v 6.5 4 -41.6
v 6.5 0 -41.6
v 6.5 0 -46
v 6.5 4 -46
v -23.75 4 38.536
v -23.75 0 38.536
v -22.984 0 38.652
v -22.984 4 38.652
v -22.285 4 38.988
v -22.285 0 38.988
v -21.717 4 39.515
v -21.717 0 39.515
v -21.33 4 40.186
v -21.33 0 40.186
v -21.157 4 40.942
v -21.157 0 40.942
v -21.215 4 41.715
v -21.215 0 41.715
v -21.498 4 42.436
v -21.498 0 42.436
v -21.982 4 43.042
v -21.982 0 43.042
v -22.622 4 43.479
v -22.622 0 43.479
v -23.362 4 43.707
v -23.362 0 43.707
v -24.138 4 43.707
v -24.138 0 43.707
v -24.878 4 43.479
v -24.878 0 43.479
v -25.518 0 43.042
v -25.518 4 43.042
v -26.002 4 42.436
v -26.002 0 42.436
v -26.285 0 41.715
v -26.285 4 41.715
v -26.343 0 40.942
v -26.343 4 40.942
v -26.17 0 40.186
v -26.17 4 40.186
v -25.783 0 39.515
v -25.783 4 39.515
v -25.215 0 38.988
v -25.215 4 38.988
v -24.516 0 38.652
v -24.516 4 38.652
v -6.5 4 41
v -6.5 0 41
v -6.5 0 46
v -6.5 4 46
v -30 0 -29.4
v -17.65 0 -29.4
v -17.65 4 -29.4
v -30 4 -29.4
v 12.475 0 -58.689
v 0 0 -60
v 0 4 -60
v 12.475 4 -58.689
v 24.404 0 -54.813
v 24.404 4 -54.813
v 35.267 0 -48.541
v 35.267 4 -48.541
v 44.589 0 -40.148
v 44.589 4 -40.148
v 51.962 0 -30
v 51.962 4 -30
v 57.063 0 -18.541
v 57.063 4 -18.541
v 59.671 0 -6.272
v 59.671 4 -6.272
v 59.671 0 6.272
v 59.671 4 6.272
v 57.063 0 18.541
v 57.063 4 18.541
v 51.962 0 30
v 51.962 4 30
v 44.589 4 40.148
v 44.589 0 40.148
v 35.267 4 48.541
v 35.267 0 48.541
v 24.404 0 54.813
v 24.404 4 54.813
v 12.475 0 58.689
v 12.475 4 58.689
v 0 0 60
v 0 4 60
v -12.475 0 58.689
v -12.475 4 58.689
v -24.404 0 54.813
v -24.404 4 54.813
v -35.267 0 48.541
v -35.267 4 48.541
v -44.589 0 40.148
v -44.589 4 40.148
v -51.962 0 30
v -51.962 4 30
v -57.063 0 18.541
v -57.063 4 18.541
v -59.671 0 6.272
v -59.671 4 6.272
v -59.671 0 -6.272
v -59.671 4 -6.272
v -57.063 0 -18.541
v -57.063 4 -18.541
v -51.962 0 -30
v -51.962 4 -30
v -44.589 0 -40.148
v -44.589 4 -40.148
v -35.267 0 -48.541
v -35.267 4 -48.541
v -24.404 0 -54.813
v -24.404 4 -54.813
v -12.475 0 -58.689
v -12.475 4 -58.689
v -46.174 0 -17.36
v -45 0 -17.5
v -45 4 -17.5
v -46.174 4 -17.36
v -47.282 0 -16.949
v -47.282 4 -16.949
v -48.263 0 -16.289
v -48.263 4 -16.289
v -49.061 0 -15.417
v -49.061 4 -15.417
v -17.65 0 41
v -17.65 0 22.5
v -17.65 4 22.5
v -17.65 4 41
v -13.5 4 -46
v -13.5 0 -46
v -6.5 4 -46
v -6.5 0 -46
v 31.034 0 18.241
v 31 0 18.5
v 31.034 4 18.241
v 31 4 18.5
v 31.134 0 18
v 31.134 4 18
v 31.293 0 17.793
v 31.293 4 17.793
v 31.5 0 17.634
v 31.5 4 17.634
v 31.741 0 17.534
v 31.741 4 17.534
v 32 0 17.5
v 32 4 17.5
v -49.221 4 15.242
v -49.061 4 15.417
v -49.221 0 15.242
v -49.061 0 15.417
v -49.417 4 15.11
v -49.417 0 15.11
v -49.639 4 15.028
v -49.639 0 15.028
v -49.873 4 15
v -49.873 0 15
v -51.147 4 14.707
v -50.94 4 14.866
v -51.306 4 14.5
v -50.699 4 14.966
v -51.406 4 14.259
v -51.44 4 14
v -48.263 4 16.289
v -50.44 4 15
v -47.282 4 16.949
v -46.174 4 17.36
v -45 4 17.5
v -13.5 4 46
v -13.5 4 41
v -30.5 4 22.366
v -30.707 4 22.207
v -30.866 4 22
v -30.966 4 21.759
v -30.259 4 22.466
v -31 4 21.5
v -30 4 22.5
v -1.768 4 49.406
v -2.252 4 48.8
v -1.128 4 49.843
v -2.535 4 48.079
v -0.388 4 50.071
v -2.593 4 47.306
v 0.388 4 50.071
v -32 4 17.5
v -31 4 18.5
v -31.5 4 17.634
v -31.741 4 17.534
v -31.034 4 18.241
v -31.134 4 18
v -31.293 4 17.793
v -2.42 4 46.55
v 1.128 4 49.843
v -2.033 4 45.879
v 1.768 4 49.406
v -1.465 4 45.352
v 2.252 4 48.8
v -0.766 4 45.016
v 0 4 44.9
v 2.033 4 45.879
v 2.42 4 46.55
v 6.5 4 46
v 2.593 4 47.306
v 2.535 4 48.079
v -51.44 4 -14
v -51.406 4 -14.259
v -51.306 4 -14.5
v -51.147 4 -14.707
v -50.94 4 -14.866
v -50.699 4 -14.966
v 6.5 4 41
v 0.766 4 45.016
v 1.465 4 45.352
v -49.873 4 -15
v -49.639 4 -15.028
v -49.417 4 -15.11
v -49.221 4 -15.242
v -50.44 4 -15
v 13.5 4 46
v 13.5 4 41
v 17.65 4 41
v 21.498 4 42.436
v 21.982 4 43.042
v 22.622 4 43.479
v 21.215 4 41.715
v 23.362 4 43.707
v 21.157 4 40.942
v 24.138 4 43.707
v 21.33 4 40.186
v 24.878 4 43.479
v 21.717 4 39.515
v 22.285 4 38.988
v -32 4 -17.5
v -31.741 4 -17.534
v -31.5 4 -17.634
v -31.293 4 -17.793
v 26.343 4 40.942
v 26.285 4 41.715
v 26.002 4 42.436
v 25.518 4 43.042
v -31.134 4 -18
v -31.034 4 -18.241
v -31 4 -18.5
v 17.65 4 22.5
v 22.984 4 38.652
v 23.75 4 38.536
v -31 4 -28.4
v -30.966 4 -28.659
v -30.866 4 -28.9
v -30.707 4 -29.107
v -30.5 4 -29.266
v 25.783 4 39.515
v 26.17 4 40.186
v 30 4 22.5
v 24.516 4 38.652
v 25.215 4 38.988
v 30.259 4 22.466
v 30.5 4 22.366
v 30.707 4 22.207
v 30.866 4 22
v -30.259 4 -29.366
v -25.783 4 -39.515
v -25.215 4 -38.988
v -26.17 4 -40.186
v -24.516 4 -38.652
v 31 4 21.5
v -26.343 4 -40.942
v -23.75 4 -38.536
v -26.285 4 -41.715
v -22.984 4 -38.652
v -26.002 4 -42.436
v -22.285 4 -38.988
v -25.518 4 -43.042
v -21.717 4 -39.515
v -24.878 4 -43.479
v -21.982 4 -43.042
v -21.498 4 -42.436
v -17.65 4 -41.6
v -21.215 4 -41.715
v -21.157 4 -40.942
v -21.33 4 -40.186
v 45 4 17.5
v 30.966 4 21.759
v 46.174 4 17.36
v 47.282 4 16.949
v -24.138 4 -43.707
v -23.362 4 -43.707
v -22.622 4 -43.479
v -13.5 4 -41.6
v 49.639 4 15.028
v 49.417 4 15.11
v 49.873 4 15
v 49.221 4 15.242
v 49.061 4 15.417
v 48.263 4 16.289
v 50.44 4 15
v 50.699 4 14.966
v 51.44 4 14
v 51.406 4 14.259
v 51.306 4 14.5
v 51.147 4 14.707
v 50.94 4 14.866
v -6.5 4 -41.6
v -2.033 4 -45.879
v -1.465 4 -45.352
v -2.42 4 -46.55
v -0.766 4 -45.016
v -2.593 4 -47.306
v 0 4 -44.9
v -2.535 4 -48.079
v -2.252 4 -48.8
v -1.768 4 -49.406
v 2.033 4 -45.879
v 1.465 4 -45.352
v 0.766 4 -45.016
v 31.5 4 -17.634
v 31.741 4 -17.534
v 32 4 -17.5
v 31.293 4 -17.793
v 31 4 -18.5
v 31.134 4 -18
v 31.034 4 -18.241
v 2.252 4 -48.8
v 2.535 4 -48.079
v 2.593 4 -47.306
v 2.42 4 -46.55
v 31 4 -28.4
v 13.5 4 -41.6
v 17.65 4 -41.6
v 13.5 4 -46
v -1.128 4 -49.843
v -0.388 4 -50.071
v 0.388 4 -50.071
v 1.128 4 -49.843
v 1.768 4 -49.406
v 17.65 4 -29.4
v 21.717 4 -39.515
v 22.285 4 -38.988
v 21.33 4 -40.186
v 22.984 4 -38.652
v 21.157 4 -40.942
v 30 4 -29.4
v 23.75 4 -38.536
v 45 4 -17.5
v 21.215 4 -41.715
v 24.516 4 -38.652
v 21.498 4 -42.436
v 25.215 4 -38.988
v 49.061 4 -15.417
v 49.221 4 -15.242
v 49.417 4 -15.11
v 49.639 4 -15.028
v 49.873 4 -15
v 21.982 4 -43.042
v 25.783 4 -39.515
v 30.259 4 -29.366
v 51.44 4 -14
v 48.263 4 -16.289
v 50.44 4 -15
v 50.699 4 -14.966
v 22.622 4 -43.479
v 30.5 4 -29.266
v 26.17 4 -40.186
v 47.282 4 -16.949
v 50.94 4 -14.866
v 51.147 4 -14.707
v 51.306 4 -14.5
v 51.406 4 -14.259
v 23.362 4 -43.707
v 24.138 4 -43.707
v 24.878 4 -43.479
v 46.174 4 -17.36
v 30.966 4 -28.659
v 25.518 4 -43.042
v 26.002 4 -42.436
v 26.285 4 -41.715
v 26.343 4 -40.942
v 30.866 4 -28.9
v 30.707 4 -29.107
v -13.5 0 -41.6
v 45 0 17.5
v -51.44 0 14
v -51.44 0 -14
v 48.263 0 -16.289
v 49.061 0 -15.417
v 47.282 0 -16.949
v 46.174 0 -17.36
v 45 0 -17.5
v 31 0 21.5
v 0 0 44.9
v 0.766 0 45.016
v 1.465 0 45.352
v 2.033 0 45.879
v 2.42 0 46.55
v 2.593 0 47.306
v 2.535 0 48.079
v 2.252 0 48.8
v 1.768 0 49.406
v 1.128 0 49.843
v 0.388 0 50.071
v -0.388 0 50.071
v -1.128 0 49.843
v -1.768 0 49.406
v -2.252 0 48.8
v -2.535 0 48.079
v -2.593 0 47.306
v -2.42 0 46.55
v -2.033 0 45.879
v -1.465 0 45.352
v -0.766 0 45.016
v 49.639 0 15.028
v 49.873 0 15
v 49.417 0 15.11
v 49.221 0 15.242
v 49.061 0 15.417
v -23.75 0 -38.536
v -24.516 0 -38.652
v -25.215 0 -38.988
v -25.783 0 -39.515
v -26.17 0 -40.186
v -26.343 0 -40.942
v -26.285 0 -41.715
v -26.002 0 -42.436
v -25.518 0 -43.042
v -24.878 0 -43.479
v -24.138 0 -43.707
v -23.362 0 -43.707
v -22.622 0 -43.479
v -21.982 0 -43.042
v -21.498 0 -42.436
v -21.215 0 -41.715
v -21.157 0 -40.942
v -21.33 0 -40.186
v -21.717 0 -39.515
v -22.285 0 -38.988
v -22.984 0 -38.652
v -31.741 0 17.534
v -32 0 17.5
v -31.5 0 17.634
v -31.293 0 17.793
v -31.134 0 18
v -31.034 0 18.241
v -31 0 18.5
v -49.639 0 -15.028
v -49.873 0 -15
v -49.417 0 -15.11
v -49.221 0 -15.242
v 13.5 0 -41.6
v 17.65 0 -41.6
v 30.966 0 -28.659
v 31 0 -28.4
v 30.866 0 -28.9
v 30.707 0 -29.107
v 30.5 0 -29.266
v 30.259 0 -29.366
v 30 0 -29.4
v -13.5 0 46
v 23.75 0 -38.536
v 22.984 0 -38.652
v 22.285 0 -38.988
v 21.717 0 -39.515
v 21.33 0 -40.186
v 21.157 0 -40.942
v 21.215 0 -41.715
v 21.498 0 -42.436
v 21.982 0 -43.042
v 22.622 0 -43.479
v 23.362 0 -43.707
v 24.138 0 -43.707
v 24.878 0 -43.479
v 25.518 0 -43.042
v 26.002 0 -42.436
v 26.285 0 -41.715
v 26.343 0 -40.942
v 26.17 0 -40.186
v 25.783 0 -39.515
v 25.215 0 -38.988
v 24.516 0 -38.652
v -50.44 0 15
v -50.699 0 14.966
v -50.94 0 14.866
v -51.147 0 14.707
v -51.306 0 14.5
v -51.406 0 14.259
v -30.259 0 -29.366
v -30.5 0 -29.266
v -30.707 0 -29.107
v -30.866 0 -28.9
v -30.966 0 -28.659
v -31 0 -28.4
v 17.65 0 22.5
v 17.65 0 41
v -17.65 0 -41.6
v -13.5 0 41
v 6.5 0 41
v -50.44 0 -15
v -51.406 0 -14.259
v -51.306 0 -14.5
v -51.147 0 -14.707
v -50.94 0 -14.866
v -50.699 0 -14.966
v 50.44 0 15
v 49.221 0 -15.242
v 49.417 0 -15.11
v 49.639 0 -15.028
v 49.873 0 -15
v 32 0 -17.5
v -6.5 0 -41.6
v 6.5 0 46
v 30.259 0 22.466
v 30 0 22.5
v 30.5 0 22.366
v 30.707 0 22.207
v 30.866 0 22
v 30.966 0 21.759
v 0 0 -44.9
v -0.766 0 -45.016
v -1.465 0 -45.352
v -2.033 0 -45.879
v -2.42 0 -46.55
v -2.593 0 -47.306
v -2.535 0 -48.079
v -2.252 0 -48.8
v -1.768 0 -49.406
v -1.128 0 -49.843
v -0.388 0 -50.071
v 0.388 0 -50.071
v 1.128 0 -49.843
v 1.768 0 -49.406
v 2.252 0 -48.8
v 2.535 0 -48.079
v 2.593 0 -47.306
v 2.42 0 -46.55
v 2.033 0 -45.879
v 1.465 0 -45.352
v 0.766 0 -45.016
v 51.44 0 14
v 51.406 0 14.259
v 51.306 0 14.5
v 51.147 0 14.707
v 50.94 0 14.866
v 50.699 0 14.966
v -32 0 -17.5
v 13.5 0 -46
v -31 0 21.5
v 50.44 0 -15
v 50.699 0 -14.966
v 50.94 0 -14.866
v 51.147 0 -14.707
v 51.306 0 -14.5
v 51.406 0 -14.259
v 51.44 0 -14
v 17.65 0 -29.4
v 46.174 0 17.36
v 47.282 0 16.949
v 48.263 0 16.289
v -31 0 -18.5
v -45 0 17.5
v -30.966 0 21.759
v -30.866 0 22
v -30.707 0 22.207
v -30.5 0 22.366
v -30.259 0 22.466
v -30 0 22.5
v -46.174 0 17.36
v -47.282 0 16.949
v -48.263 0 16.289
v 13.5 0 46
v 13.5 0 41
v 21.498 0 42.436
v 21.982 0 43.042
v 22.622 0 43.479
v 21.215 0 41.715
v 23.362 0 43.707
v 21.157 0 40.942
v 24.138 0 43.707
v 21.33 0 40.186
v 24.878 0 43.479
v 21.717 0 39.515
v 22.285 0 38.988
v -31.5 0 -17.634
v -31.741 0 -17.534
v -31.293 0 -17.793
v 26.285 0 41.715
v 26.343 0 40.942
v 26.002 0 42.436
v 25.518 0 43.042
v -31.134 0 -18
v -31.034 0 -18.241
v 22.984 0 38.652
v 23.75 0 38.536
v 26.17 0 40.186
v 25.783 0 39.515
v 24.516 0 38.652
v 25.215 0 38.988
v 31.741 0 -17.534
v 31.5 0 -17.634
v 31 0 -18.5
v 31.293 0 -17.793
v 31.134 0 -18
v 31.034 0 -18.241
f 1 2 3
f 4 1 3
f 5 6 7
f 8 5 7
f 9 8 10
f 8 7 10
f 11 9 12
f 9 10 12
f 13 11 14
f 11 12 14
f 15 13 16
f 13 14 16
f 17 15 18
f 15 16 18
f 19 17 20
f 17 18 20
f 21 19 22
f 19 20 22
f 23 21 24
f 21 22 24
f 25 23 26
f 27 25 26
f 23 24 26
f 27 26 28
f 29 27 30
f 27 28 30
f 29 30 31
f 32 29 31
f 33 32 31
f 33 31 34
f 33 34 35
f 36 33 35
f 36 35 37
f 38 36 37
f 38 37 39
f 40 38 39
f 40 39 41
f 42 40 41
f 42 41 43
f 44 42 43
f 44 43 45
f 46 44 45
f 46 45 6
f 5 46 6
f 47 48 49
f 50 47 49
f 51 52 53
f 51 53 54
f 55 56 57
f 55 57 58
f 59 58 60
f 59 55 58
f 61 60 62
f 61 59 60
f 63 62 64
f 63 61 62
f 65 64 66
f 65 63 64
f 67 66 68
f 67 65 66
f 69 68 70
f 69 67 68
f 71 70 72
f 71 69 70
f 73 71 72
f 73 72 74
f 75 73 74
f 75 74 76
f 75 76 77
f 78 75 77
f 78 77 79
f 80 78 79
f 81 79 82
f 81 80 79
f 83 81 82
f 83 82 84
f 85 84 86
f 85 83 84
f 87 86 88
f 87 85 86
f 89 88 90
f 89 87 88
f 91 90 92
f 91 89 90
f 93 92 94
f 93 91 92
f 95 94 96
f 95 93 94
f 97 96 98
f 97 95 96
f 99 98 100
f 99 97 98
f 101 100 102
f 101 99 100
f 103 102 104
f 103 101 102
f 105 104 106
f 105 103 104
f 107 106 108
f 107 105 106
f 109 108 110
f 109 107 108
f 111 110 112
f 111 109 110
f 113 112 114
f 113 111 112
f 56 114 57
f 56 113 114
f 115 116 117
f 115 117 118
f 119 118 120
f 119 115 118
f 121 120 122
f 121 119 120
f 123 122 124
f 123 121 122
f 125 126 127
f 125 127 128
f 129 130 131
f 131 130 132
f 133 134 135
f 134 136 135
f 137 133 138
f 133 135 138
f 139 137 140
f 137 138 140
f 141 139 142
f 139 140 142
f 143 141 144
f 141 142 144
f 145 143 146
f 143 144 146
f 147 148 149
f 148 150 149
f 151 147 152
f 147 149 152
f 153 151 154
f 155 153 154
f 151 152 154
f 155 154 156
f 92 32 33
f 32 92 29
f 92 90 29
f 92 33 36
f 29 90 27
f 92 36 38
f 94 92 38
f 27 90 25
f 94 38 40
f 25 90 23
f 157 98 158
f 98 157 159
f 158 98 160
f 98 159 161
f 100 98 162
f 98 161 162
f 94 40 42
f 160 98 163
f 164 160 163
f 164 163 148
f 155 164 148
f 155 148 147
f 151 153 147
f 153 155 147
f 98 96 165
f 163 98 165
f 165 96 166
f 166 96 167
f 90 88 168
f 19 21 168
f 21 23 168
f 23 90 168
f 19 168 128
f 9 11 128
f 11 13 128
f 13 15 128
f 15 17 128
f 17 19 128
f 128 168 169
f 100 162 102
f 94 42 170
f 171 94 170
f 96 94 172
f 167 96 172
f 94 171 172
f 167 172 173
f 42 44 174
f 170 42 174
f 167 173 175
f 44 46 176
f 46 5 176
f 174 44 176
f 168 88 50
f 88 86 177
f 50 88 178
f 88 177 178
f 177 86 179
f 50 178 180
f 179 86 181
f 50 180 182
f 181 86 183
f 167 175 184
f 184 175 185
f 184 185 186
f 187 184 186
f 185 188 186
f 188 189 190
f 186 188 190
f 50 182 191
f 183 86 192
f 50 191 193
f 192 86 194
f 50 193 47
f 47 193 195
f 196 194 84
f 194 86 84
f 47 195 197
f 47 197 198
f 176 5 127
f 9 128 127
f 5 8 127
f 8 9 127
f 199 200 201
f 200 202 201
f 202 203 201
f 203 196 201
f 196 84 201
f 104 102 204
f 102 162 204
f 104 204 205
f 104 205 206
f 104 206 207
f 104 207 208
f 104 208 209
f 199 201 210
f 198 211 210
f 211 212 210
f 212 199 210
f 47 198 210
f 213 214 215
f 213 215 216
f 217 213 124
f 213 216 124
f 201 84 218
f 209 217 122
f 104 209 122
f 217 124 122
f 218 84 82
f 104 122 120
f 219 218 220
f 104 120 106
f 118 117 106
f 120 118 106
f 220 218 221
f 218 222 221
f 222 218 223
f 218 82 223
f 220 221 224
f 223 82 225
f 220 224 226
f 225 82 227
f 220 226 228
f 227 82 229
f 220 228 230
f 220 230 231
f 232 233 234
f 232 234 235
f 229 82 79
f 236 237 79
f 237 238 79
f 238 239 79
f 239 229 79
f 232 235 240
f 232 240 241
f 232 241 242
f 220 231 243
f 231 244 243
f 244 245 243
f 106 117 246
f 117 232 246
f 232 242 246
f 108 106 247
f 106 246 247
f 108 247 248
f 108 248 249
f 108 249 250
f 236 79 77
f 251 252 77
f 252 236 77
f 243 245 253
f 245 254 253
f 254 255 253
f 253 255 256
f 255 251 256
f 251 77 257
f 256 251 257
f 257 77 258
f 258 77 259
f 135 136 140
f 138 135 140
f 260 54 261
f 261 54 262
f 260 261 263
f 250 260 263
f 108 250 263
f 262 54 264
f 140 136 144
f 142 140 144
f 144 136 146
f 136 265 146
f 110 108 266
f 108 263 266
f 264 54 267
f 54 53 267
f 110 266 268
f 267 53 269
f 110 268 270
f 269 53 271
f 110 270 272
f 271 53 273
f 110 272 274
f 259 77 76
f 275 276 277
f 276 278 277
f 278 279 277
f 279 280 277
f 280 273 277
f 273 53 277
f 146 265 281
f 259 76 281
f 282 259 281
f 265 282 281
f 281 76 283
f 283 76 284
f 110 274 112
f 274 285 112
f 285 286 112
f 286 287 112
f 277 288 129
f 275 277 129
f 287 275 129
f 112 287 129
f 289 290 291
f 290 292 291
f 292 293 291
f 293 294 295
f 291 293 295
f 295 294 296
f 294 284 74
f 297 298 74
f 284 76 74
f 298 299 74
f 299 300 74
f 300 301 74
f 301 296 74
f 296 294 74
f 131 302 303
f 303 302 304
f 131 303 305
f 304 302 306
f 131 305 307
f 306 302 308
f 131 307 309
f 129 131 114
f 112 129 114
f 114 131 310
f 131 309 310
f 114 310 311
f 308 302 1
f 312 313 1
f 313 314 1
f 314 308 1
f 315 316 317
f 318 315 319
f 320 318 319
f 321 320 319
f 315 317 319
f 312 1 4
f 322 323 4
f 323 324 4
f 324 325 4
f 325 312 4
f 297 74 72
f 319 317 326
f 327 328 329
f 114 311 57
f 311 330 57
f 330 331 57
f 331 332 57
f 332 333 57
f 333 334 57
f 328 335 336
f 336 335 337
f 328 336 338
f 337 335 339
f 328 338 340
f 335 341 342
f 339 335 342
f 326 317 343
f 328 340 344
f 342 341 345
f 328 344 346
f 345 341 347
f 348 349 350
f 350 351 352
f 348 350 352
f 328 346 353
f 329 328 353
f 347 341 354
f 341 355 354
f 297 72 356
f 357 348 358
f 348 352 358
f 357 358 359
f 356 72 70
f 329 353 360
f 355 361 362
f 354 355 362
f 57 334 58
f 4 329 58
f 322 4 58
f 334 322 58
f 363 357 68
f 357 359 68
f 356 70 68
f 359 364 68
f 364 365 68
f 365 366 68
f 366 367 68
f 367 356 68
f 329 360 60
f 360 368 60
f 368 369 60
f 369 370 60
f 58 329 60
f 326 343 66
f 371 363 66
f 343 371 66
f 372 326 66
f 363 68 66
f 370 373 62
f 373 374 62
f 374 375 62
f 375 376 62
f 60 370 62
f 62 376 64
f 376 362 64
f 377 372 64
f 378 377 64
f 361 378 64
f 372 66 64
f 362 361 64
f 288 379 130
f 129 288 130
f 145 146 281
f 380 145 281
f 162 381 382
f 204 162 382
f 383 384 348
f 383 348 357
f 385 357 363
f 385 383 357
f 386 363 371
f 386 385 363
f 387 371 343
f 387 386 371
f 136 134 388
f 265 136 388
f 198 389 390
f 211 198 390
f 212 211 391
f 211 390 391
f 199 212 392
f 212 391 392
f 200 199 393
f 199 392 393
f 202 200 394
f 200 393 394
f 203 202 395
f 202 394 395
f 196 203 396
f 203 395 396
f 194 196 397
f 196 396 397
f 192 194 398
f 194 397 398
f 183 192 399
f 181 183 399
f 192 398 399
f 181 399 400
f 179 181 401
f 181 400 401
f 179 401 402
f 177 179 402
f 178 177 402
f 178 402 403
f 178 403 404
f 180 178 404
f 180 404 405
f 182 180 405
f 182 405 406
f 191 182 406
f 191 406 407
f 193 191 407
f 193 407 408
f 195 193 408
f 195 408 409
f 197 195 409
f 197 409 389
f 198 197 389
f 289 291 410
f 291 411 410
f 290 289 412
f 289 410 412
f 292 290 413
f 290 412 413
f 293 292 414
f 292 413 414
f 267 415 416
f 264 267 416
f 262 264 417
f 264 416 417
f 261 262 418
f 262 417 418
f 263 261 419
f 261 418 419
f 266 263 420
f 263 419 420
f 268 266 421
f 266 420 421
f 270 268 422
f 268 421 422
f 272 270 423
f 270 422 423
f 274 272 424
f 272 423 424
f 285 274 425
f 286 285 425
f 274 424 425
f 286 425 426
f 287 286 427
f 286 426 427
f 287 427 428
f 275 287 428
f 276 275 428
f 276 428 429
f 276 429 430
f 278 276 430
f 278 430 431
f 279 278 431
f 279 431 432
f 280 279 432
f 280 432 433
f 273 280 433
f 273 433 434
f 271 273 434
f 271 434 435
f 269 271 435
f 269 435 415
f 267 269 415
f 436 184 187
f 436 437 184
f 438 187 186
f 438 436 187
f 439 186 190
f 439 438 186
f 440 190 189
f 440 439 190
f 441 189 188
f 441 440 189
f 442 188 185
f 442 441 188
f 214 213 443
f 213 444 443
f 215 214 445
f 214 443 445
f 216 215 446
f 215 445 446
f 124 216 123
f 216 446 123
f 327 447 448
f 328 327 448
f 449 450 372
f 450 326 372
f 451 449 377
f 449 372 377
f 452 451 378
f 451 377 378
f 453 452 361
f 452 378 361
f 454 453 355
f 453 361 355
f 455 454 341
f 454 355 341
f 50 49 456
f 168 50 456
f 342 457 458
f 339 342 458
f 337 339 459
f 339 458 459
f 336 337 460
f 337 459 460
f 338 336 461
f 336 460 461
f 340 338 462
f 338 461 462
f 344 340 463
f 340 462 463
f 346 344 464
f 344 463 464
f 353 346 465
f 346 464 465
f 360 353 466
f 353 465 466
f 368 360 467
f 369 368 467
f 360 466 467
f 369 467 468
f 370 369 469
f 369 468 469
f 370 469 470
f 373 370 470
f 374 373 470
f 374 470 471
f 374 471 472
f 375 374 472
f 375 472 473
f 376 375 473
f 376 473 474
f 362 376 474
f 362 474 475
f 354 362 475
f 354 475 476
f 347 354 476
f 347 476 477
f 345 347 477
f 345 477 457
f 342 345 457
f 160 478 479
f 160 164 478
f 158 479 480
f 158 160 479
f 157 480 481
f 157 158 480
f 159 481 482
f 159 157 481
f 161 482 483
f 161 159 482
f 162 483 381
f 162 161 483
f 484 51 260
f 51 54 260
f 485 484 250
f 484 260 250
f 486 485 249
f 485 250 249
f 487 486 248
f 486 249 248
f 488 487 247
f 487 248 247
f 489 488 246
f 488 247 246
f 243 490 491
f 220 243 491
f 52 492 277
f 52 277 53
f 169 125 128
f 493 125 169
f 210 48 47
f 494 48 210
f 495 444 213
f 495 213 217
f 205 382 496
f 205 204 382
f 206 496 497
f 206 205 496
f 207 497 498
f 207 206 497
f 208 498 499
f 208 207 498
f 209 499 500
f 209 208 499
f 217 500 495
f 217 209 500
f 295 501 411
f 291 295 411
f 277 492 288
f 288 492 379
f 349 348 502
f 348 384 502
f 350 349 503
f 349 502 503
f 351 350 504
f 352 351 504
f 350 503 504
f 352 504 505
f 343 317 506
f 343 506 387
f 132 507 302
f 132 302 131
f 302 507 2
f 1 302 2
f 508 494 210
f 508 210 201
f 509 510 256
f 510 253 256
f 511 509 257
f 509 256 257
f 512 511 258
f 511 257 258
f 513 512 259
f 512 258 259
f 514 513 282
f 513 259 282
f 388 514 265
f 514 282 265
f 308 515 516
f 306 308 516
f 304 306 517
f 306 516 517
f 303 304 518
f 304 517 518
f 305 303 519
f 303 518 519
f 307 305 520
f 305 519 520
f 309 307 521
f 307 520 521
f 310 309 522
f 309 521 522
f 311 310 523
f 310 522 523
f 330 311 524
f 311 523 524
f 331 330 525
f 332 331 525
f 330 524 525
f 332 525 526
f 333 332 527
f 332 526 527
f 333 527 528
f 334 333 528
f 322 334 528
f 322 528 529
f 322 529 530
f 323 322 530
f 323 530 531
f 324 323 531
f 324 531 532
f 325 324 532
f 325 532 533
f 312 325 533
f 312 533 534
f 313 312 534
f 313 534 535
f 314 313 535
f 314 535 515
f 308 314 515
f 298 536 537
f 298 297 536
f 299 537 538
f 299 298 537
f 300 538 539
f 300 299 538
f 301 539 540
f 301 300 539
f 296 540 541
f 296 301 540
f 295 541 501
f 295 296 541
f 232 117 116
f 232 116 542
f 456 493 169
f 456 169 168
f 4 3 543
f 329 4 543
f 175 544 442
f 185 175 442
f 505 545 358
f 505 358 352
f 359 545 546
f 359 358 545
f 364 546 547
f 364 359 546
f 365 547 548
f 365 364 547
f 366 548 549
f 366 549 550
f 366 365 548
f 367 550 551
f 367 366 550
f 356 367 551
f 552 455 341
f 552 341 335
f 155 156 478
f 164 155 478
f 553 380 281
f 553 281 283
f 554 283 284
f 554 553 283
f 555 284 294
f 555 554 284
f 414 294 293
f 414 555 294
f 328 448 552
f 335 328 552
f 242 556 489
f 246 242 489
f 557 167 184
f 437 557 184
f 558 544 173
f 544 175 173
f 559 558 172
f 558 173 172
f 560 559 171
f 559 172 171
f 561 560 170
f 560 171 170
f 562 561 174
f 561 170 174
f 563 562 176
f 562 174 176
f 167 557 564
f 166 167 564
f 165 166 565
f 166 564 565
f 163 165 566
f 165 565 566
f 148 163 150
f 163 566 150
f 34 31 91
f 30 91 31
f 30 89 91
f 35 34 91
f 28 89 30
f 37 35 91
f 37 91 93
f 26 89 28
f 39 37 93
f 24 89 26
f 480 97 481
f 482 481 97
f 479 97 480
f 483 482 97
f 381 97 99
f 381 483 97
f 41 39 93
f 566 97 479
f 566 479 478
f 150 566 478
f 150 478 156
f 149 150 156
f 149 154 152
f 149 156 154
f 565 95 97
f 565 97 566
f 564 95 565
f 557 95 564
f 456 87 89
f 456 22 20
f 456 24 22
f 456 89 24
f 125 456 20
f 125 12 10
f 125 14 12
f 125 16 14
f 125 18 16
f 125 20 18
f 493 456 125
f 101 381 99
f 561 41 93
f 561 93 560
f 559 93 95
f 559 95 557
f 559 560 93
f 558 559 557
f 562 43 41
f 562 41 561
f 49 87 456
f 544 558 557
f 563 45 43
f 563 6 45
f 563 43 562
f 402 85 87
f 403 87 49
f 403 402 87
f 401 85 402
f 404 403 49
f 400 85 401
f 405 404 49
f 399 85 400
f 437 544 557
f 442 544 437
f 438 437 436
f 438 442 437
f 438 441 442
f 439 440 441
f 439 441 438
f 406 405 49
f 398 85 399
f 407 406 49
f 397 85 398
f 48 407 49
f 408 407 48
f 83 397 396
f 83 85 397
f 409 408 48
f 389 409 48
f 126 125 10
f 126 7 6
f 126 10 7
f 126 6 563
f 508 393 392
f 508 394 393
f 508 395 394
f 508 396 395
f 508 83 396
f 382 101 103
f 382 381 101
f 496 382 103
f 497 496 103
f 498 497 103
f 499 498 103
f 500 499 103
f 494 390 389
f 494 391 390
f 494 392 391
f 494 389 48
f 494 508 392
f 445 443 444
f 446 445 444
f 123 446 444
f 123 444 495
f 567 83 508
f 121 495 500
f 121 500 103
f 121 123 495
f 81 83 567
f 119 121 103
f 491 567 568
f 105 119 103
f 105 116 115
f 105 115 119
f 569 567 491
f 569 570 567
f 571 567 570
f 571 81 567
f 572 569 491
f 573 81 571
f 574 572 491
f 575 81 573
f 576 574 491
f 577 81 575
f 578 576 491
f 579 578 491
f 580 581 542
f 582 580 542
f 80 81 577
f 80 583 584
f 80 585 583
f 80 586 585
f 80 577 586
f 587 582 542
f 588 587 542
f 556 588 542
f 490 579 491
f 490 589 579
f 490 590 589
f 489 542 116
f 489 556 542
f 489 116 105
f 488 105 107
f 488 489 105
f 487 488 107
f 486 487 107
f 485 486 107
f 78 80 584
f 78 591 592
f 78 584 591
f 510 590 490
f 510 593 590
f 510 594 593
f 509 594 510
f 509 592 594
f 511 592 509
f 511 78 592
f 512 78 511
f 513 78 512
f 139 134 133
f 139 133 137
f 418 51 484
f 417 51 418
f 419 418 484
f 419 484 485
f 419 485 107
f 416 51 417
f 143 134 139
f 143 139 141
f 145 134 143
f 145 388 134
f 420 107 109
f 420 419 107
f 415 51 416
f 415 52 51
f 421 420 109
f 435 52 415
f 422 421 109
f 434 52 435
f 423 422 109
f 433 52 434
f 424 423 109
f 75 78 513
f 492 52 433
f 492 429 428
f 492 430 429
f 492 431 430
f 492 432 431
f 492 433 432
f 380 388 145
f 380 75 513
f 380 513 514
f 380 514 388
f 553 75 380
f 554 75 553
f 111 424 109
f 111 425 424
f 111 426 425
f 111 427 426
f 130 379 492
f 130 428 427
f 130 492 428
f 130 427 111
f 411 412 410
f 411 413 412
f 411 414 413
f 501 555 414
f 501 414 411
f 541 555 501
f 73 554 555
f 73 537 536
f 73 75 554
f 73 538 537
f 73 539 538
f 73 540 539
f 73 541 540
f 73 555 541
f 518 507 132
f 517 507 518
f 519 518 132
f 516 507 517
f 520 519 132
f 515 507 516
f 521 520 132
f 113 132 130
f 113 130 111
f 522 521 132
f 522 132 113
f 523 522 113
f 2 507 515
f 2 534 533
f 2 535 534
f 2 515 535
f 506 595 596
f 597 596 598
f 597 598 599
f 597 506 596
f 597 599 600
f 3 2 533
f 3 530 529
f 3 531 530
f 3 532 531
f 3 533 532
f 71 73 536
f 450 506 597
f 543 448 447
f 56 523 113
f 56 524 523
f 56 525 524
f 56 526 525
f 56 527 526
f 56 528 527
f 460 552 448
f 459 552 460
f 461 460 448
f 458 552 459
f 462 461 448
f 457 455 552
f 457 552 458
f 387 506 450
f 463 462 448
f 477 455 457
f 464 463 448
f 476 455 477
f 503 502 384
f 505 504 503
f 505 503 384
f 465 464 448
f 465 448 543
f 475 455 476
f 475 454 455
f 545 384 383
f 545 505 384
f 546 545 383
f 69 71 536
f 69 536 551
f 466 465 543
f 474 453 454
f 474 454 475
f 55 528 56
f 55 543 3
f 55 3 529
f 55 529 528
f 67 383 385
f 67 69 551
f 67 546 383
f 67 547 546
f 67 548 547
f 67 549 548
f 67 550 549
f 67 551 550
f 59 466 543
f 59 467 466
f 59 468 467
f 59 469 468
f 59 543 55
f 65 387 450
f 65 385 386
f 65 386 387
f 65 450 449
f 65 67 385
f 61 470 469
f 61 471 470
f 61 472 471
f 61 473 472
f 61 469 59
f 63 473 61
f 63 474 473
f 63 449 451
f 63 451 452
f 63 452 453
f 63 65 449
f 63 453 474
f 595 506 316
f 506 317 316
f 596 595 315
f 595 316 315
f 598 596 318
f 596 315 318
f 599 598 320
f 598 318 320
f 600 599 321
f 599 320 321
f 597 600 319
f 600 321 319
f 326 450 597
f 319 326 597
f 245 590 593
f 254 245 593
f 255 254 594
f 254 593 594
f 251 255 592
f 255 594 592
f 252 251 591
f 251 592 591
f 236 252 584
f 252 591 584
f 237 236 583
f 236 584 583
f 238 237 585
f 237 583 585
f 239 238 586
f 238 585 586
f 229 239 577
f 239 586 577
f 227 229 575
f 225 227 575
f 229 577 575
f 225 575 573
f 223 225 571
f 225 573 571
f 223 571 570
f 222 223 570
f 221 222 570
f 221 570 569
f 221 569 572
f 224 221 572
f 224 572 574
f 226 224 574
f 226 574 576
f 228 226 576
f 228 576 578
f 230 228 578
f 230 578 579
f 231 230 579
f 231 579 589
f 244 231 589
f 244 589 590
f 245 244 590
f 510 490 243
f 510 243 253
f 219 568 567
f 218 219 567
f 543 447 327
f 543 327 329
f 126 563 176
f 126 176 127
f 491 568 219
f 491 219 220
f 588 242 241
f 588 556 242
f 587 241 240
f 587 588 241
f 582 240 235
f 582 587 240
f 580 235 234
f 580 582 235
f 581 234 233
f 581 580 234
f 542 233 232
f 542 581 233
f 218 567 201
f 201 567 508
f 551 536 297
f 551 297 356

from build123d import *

# Parameters (mm, degrees)
SKETCH_1_R               = 54.5
EXTRUDE_1_DEPTH          = 4
SKETCH_2_W               = 100
SKETCH_2_H               = 35
CUT_EXTRUDE_1_DEPTH      = 4
FILLET_1_R               = 5
SKETCH_3_R               = 2.6
CUT_EXTRUDE_2_DEPTH      = 10
PATTERN_CIRCULAR_1_COUNT = 2
SKETCH_4_R               = 2.6
CUT_EXTRUDE_3_DEPTH      = 10
SKETCH_5_R               = 2.6
CUT_EXTRUDE_4_DEPTH      = 100
SKETCH_6_W               = 35.3
SKETCH_6_H               = 19.5
SKETCH_6_R               = 2.6
SKETCH_6_H_2             = 1.5
CUT_EXTRUDE_5_DEPTH      = 10
CUT_EXTRUDE_6_DEPTH      = 10
FILLET_2_R               = 1
SKETCH_8_W               = 35.3
SKETCH_8_H               = 3.1
CUT_EXTRUDE_7_DEPTH      = 10
SKETCH_10_W              = 35.3
SKETCH_10_H              = 4
CUT_EXTRUDE_8_DEPTH      = 54.5
SKETCH_11_R              = 56.5
SKETCH_11_R_2            = 54.5
EXTRUDE_2_DEPTH          = 4
SKETCH_12_W              = 3.5
SKETCH_12_H              = 5
CUT_EXTRUDE_9_DEPTH      = 6
PATTERN_CIRCULAR_2_COUNT = 2
SKETCH_14_W              = 102.88
SKETCH_14_H              = 30
CUT_EXTRUDE_10_DEPTH     = 30
FILLET_3_R               = 1
SKETCH_15_R              = 60
SKETCH_15_R_2            = 56.5
EXTRUDE_3_DEPTH          = 4


with BuildPart() as part:
    # 草图1 → 凸台-拉伸1 (new body)
    with BuildSketch(Plane(origin=(0, 0, 0), x_dir=(1, 0, 0), z_dir=(0, 1, 0))):
        with Locations(Location((0, 0, 0), (0, 0, 270))):
            Circle(SKETCH_1_R)
    extrude(amount=EXTRUDE_1_DEPTH)

    # 草图2 → 切除-拉伸1 (cut)
    with BuildSketch(Plane(origin=(0, 4, 0), x_dir=(1, 0, 0), z_dir=(0, 1, 0))):
        Rectangle(SKETCH_2_W, SKETCH_2_H)
    extrude(amount=-CUT_EXTRUDE_1_DEPTH, mode=Mode.SUBTRACT)

    # 圆角1
    fillet_1_edges = [part.edges().sort_by_distance(p)[0] for p in [
        (50, 2, -17.5),
        (50, 2, 17.5),
        (-50, 2, 17.5),
        (-50, 2, -17.5),
    ]]
    fillet(fillet_1_edges, radius=FILLET_1_R)

    # 草图3 → 切除-拉伸2 (cut)
    with BuildSketch(Plane.XZ):
        with Locations(Location((-23.75, 41.13620668, 0), (0, 0, 270))):
            Circle(SKETCH_3_R)
        with Locations(Location((23.75, 41.13620668, 0), (0, 0, 270))):
            Circle(SKETCH_3_R)
        with Locations(Location((0, 47.5, 0), (0, 0, 270))):
            Circle(SKETCH_3_R)
    cut_extrude_2 = extrude(amount=-CUT_EXTRUDE_2_DEPTH, mode=Mode.SUBTRACT)

    # 阵列(圆周)1: 切除-拉伸2 ×2 about axis
    pattern_circular_1_axis = Axis((0, 0, 0), (0, 1, 0))
    for i in range(1, PATTERN_CIRCULAR_1_COUNT):
        add(cut_extrude_2.rotate(pattern_circular_1_axis, i * 360 / PATTERN_CIRCULAR_1_COUNT), mode=Mode.SUBTRACT)

    # 草图4 → 切除-拉伸3 (cut)
    with BuildSketch(Plane.XZ):
        with Locations(Location((-15, 29.5, 0), (0, 0, 270))):
            Circle(SKETCH_4_R)
        with Locations(Location((15, 29.5, 0), (0, 0, 270))):
            Circle(SKETCH_4_R)
    extrude(amount=-CUT_EXTRUDE_3_DEPTH, mode=Mode.SUBTRACT)

    # 草图5 → 切除-拉伸4 (cut)
    with BuildSketch(Plane.XZ):
        with Locations(Location((-15, -33.5, 0), (0, 0, 270))):
            Circle(SKETCH_5_R)
        with Locations(Location((15, -33.5, 0), (0, 0, 270))):
            Circle(SKETCH_5_R)
    extrude(amount=-CUT_EXTRUDE_4_DEPTH, mode=Mode.SUBTRACT)

    # 草图6 → 切除-拉伸5 (cut)
    # profile 1 of 3: a face of its own
    with BuildSketch(Plane.XZ):
        with Locations((0, -27.25)):
            Rectangle(SKETCH_6_W, SKETCH_6_H)
        with Locations((-15, -33.5)):
            Circle(SKETCH_6_R, mode=Mode.SUBTRACT)
        with Locations((15, -33.5)):
            Circle(SKETCH_6_R, mode=Mode.SUBTRACT)
    # profile 2 of 3: a face of its own
    with BuildSketch(Plane.XZ):
        with Locations((0, -37.75)):
            Rectangle(SKETCH_6_W, SKETCH_6_H_2)
    # profile 3 of 3: a face of its own
    with BuildSketch(Plane.XZ):
        with Locations((0, 27.25)):
            Rectangle(SKETCH_6_W, SKETCH_6_H)
        with Locations((-15, 29.5)):
            Circle(SKETCH_6_R, mode=Mode.SUBTRACT)
        with Locations((15, 29.5)):
            Circle(SKETCH_6_R, mode=Mode.SUBTRACT)
    extrude(amount=-CUT_EXTRUDE_5_DEPTH, mode=Mode.SUBTRACT)

    # 草图7 → 切除-拉伸6 (cut)
    with BuildSketch(Plane.XZ):
        Polygon((-31, 22.5), (31, 22.5), (31, -22.5), (31, -29.4), (-31, -29.4), (-31, -22.5), align=None)
    extrude(amount=-CUT_EXTRUDE_6_DEPTH, mode=Mode.SUBTRACT)

    # 圆角2
    fillet_2_edges = [part.edges().sort_by_distance(p)[0] for p in [
        (31, 2, -17.5),
        (-31, 2, -17.5),
        (-31, 2, 17.5),
        (31, 2, 22.5),
        (31, 2, 17.5),
        (-31, 2, 22.5),
        (31, 2, -29.4),
        (-31, 2, -29.4),
    ]]
    fillet(fillet_2_edges, radius=FILLET_2_R)

    # 草图8 → 切除-拉伸7 (cut)
    with BuildSketch(Plane.XZ):
        with Locations((0, -40.05)):
            Rectangle(SKETCH_8_W, SKETCH_8_H)
    extrude(amount=-CUT_EXTRUDE_7_DEPTH, mode=Mode.SUBTRACT)

    # 草图10 → 切除-拉伸8 (cut)
    with BuildSketch(Plane.XZ):
        with Locations((0, 39)):
            Rectangle(SKETCH_10_W, SKETCH_10_H)
    extrude(amount=-CUT_EXTRUDE_8_DEPTH, mode=Mode.SUBTRACT)

    # 草图11 → 凸台-拉伸2 (add)
    with BuildSketch(Plane.XZ):
        with Locations(Location((0, 0, 0), (0, 0, 270))):
            Circle(SKETCH_11_R)
        Circle(SKETCH_11_R_2, mode=Mode.SUBTRACT)
    extrude(amount=-EXTRUDE_2_DEPTH)

    # 草图12 → 切除-拉伸9 (cut)
    with BuildSketch(Plane.XZ):
        with Locations((-8.25, 43.5)):
            Rectangle(SKETCH_12_W, SKETCH_12_H)
        with Locations((-11.75, 43.5)):
            Rectangle(SKETCH_12_W, SKETCH_12_H)
        with Locations((8.25, 43.5)):
            Rectangle(SKETCH_12_W, SKETCH_12_H)
        with Locations((11.75, 43.5)):
            Rectangle(SKETCH_12_W, SKETCH_12_H)
    cut_extrude_9 = extrude(amount=-CUT_EXTRUDE_9_DEPTH, mode=Mode.SUBTRACT)

    # 阵列(圆周)2: 切除-拉伸9 ×2 about axis
    pattern_circular_2_axis = Axis((0, 0, 0), (0, 1, 0))
    for i in range(1, PATTERN_CIRCULAR_2_COUNT):
        add(cut_extrude_9.rotate(pattern_circular_2_axis, i * 360 / PATTERN_CIRCULAR_2_COUNT), mode=Mode.SUBTRACT)

    # 草图14 → 切除-拉伸10 (cut)
    with BuildSketch(Plane(origin=(0, 0, 0), x_dir=(-1, 0, 0), z_dir=(0, -1, 0))):
        Rectangle(SKETCH_14_W, SKETCH_14_H)
    extrude(amount=-CUT_EXTRUDE_10_DEPTH, mode=Mode.SUBTRACT)

    # 圆角3
    fillet_3_edges = [part.edges().sort_by_distance(p)[0] for p in [
        (-49.330127019, 2, -15),
        (49.330127019, 2, 15),
        (-51.44, 2, 15),
        (-49.330127019, 2, 15),
        (51.44, 2, -15),
        (49.330127019, 2, -15),
        (-51.44, 2, -15),
        (51.44, 2, 15),
    ]]
    fillet(fillet_3_edges, radius=FILLET_3_R)

    # 草图15 → 凸台-拉伸3 (add)
    with BuildSketch(Plane.XZ):
        with Locations(Location((0, 0, 0), (0, 0, 270))):
            Circle(SKETCH_15_R)
        Circle(SKETCH_15_R_2, mode=Mode.SUBTRACT)
    extrude(amount=-EXTRUDE_3_DEPTH)


solid = part.part
